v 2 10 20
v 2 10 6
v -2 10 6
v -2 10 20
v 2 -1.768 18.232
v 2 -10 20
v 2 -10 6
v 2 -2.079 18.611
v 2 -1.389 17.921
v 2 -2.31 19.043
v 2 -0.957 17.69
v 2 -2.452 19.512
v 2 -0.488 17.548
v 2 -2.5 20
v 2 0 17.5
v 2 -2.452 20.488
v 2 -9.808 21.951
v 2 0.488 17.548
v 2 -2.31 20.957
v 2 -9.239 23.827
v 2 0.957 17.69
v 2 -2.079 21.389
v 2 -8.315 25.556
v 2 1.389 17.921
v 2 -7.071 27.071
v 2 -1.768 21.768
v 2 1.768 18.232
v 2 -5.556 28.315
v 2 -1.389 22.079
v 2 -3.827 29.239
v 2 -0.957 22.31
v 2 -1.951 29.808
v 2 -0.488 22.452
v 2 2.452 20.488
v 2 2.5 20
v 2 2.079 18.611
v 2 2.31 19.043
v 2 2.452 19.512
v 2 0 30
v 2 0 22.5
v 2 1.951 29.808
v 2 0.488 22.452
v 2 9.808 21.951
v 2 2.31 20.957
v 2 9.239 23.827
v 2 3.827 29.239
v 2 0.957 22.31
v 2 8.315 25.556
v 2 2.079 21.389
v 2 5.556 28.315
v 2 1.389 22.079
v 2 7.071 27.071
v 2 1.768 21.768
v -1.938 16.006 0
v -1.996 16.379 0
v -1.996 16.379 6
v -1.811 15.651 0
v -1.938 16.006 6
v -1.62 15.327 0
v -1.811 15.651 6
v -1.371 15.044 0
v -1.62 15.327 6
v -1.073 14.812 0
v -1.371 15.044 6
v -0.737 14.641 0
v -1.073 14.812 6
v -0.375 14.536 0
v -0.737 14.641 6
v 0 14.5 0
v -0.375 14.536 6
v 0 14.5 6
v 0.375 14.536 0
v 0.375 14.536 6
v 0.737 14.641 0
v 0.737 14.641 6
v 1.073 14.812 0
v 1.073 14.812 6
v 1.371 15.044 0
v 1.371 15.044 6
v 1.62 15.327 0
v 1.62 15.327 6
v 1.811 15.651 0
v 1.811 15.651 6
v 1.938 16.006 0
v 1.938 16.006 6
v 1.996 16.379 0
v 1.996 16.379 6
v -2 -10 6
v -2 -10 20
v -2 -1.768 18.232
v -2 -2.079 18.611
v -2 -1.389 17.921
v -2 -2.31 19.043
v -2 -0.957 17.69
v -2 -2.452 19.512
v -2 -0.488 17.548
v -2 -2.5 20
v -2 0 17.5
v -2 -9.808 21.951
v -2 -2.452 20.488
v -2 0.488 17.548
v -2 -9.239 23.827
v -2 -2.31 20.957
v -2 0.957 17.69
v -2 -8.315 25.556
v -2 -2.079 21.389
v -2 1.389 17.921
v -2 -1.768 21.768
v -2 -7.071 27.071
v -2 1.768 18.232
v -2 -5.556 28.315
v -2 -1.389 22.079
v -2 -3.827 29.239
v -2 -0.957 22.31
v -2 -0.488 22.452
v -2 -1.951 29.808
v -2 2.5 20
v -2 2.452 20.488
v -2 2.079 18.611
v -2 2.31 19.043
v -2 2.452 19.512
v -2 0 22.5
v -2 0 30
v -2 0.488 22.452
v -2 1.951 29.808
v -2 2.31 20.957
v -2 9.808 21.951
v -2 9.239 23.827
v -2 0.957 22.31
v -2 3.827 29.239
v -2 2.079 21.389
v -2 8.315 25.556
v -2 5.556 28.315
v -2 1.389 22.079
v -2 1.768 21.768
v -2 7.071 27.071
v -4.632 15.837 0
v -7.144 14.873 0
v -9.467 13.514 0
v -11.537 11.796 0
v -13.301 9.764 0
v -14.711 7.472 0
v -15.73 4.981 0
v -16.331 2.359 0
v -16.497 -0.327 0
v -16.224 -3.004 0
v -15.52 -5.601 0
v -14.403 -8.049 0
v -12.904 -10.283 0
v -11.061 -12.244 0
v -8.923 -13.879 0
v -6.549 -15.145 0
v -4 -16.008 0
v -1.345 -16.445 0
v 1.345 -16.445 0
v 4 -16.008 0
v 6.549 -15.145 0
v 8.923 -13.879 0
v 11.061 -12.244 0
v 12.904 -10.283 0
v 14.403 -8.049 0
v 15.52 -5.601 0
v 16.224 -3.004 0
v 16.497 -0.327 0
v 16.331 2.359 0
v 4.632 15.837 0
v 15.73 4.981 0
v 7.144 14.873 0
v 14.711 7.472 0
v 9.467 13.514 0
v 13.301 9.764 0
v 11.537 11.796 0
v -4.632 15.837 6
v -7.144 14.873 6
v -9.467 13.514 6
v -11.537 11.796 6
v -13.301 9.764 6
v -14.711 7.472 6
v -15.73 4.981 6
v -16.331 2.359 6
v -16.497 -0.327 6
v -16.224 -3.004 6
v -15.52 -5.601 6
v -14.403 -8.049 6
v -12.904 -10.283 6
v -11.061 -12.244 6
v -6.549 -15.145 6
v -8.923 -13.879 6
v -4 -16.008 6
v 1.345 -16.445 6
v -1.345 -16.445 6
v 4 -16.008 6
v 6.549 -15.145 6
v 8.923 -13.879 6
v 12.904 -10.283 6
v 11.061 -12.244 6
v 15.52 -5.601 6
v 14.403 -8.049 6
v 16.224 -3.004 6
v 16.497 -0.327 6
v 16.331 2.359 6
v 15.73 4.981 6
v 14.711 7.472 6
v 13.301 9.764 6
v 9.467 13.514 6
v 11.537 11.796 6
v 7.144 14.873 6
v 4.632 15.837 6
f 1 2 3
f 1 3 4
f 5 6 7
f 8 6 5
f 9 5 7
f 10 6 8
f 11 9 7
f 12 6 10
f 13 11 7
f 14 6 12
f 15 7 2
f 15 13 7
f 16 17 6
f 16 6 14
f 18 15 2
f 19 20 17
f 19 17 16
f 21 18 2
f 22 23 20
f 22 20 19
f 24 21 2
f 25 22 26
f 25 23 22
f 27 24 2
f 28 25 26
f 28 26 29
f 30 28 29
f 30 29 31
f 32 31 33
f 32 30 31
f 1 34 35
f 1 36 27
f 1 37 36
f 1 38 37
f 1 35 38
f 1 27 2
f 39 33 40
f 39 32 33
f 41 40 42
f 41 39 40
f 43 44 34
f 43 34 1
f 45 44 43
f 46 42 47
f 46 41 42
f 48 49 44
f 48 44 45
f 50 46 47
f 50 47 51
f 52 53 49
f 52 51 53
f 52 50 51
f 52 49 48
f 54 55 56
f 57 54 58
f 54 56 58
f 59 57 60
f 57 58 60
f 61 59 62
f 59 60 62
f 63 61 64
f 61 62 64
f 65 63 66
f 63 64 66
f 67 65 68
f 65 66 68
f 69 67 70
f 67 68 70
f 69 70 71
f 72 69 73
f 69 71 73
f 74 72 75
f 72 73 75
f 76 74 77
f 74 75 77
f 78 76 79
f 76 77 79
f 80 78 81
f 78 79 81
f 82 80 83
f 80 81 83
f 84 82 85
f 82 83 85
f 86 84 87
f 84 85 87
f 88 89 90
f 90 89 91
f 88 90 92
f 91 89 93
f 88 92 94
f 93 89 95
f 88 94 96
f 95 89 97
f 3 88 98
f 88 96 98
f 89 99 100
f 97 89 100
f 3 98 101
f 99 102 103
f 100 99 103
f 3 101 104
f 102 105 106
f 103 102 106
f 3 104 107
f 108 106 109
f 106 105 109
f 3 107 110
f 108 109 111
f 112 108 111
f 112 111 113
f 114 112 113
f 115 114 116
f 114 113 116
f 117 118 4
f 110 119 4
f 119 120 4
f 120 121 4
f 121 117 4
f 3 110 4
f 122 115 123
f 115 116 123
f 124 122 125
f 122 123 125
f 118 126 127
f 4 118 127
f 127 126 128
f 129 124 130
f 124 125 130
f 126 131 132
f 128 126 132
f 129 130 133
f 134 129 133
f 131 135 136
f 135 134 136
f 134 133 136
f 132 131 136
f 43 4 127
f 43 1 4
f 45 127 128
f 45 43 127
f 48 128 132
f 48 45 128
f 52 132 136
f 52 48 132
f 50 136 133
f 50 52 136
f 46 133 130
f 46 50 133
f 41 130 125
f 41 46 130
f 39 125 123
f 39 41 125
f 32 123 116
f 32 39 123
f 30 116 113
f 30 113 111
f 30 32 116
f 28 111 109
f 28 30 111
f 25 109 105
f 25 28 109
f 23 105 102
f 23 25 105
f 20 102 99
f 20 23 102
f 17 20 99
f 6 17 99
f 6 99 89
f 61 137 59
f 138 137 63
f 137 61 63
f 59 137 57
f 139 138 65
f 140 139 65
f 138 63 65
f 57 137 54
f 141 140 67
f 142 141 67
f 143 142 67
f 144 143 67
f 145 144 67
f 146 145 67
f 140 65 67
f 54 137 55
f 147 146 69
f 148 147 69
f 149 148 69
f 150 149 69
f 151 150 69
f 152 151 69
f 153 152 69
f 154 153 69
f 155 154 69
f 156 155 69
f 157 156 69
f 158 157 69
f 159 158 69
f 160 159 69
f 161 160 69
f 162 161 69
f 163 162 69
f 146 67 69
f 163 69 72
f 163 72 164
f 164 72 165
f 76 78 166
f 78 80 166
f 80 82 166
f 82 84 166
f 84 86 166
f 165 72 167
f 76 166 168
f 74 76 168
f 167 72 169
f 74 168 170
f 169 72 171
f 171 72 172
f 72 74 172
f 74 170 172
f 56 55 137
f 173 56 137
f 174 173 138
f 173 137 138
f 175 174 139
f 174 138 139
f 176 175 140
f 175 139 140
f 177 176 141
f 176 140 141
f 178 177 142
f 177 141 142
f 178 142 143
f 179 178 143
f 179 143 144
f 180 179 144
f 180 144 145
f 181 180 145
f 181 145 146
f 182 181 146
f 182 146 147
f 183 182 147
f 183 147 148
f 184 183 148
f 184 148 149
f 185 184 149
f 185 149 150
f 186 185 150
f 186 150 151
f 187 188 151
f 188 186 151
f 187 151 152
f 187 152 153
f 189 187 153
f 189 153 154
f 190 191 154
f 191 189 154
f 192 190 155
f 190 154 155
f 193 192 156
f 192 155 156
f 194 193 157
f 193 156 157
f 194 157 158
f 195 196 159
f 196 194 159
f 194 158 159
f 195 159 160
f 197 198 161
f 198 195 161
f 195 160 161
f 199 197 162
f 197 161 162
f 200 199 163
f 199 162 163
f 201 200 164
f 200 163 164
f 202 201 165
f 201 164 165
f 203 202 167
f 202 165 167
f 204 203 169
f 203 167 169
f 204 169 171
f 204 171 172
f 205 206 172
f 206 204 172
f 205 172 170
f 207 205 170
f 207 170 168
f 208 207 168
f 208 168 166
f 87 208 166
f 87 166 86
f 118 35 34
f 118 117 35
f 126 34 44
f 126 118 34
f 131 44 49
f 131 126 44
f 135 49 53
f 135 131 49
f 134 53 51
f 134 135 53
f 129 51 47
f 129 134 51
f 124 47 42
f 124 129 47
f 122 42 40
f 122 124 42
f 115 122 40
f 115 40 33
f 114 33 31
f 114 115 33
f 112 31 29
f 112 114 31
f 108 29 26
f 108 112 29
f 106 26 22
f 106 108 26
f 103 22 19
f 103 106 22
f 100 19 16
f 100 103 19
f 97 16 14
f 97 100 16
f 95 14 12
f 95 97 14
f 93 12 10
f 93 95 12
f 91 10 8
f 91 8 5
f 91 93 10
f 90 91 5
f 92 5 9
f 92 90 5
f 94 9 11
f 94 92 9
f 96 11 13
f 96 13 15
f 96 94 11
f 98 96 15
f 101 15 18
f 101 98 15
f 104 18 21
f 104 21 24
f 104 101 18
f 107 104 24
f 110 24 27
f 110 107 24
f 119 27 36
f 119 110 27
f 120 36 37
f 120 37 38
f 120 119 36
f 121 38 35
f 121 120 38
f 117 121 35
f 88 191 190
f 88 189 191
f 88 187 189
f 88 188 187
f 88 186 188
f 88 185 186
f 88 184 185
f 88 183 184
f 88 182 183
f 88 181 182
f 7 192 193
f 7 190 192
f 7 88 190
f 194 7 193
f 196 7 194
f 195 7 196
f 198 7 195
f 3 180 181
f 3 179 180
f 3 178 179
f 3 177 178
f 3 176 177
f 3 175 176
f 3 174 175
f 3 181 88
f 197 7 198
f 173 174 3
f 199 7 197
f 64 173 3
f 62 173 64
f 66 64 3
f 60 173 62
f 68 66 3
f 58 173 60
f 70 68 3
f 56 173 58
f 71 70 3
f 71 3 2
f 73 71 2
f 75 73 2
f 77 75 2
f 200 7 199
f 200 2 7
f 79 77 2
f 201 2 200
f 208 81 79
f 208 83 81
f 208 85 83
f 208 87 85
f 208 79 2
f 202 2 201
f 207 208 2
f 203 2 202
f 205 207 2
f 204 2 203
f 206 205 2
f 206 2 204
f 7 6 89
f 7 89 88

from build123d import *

# Parameters (mm, degrees)
SKETCH_R     = 16.5
PAD_DEPTH    = 6
SKETCH001_R  = 2
POCKET_DEPTH = 6.001
SKETCH002_R  = 2.5
PAD001_DEPTH = 2


with BuildPart() as part:
    # Sketch → Pad (new body)
    with BuildSketch(Plane.XY):
        Circle(SKETCH_R)
    extrude(amount=PAD_DEPTH)

    # Sketch001 (on Face3 of Pad) → Pocket (cut, through all)
    with BuildSketch(Plane.XY.offset(6)):
        with Locations((0, 16.5)):
            Circle(SKETCH001_R)
    extrude(amount=-POCKET_DEPTH, mode=Mode.SUBTRACT)

    # Sketch002 → Pad001 (join, symmetric)
    with BuildSketch(Plane.YZ):
        with BuildLine():
            Line((-10, 20), (-10, 0))
            Line((-10, 0), (10, 0))
            Line((10, 0), (10, 20))
            ThreePointArc((10, 20), (0, 30), (-10, 20))
        make_face()
        with Locations((0, 20)):
            Circle(SKETCH002_R, mode=Mode.SUBTRACT)
    extrude(amount=PAD001_DEPTH, both=True)


solid = part.part
